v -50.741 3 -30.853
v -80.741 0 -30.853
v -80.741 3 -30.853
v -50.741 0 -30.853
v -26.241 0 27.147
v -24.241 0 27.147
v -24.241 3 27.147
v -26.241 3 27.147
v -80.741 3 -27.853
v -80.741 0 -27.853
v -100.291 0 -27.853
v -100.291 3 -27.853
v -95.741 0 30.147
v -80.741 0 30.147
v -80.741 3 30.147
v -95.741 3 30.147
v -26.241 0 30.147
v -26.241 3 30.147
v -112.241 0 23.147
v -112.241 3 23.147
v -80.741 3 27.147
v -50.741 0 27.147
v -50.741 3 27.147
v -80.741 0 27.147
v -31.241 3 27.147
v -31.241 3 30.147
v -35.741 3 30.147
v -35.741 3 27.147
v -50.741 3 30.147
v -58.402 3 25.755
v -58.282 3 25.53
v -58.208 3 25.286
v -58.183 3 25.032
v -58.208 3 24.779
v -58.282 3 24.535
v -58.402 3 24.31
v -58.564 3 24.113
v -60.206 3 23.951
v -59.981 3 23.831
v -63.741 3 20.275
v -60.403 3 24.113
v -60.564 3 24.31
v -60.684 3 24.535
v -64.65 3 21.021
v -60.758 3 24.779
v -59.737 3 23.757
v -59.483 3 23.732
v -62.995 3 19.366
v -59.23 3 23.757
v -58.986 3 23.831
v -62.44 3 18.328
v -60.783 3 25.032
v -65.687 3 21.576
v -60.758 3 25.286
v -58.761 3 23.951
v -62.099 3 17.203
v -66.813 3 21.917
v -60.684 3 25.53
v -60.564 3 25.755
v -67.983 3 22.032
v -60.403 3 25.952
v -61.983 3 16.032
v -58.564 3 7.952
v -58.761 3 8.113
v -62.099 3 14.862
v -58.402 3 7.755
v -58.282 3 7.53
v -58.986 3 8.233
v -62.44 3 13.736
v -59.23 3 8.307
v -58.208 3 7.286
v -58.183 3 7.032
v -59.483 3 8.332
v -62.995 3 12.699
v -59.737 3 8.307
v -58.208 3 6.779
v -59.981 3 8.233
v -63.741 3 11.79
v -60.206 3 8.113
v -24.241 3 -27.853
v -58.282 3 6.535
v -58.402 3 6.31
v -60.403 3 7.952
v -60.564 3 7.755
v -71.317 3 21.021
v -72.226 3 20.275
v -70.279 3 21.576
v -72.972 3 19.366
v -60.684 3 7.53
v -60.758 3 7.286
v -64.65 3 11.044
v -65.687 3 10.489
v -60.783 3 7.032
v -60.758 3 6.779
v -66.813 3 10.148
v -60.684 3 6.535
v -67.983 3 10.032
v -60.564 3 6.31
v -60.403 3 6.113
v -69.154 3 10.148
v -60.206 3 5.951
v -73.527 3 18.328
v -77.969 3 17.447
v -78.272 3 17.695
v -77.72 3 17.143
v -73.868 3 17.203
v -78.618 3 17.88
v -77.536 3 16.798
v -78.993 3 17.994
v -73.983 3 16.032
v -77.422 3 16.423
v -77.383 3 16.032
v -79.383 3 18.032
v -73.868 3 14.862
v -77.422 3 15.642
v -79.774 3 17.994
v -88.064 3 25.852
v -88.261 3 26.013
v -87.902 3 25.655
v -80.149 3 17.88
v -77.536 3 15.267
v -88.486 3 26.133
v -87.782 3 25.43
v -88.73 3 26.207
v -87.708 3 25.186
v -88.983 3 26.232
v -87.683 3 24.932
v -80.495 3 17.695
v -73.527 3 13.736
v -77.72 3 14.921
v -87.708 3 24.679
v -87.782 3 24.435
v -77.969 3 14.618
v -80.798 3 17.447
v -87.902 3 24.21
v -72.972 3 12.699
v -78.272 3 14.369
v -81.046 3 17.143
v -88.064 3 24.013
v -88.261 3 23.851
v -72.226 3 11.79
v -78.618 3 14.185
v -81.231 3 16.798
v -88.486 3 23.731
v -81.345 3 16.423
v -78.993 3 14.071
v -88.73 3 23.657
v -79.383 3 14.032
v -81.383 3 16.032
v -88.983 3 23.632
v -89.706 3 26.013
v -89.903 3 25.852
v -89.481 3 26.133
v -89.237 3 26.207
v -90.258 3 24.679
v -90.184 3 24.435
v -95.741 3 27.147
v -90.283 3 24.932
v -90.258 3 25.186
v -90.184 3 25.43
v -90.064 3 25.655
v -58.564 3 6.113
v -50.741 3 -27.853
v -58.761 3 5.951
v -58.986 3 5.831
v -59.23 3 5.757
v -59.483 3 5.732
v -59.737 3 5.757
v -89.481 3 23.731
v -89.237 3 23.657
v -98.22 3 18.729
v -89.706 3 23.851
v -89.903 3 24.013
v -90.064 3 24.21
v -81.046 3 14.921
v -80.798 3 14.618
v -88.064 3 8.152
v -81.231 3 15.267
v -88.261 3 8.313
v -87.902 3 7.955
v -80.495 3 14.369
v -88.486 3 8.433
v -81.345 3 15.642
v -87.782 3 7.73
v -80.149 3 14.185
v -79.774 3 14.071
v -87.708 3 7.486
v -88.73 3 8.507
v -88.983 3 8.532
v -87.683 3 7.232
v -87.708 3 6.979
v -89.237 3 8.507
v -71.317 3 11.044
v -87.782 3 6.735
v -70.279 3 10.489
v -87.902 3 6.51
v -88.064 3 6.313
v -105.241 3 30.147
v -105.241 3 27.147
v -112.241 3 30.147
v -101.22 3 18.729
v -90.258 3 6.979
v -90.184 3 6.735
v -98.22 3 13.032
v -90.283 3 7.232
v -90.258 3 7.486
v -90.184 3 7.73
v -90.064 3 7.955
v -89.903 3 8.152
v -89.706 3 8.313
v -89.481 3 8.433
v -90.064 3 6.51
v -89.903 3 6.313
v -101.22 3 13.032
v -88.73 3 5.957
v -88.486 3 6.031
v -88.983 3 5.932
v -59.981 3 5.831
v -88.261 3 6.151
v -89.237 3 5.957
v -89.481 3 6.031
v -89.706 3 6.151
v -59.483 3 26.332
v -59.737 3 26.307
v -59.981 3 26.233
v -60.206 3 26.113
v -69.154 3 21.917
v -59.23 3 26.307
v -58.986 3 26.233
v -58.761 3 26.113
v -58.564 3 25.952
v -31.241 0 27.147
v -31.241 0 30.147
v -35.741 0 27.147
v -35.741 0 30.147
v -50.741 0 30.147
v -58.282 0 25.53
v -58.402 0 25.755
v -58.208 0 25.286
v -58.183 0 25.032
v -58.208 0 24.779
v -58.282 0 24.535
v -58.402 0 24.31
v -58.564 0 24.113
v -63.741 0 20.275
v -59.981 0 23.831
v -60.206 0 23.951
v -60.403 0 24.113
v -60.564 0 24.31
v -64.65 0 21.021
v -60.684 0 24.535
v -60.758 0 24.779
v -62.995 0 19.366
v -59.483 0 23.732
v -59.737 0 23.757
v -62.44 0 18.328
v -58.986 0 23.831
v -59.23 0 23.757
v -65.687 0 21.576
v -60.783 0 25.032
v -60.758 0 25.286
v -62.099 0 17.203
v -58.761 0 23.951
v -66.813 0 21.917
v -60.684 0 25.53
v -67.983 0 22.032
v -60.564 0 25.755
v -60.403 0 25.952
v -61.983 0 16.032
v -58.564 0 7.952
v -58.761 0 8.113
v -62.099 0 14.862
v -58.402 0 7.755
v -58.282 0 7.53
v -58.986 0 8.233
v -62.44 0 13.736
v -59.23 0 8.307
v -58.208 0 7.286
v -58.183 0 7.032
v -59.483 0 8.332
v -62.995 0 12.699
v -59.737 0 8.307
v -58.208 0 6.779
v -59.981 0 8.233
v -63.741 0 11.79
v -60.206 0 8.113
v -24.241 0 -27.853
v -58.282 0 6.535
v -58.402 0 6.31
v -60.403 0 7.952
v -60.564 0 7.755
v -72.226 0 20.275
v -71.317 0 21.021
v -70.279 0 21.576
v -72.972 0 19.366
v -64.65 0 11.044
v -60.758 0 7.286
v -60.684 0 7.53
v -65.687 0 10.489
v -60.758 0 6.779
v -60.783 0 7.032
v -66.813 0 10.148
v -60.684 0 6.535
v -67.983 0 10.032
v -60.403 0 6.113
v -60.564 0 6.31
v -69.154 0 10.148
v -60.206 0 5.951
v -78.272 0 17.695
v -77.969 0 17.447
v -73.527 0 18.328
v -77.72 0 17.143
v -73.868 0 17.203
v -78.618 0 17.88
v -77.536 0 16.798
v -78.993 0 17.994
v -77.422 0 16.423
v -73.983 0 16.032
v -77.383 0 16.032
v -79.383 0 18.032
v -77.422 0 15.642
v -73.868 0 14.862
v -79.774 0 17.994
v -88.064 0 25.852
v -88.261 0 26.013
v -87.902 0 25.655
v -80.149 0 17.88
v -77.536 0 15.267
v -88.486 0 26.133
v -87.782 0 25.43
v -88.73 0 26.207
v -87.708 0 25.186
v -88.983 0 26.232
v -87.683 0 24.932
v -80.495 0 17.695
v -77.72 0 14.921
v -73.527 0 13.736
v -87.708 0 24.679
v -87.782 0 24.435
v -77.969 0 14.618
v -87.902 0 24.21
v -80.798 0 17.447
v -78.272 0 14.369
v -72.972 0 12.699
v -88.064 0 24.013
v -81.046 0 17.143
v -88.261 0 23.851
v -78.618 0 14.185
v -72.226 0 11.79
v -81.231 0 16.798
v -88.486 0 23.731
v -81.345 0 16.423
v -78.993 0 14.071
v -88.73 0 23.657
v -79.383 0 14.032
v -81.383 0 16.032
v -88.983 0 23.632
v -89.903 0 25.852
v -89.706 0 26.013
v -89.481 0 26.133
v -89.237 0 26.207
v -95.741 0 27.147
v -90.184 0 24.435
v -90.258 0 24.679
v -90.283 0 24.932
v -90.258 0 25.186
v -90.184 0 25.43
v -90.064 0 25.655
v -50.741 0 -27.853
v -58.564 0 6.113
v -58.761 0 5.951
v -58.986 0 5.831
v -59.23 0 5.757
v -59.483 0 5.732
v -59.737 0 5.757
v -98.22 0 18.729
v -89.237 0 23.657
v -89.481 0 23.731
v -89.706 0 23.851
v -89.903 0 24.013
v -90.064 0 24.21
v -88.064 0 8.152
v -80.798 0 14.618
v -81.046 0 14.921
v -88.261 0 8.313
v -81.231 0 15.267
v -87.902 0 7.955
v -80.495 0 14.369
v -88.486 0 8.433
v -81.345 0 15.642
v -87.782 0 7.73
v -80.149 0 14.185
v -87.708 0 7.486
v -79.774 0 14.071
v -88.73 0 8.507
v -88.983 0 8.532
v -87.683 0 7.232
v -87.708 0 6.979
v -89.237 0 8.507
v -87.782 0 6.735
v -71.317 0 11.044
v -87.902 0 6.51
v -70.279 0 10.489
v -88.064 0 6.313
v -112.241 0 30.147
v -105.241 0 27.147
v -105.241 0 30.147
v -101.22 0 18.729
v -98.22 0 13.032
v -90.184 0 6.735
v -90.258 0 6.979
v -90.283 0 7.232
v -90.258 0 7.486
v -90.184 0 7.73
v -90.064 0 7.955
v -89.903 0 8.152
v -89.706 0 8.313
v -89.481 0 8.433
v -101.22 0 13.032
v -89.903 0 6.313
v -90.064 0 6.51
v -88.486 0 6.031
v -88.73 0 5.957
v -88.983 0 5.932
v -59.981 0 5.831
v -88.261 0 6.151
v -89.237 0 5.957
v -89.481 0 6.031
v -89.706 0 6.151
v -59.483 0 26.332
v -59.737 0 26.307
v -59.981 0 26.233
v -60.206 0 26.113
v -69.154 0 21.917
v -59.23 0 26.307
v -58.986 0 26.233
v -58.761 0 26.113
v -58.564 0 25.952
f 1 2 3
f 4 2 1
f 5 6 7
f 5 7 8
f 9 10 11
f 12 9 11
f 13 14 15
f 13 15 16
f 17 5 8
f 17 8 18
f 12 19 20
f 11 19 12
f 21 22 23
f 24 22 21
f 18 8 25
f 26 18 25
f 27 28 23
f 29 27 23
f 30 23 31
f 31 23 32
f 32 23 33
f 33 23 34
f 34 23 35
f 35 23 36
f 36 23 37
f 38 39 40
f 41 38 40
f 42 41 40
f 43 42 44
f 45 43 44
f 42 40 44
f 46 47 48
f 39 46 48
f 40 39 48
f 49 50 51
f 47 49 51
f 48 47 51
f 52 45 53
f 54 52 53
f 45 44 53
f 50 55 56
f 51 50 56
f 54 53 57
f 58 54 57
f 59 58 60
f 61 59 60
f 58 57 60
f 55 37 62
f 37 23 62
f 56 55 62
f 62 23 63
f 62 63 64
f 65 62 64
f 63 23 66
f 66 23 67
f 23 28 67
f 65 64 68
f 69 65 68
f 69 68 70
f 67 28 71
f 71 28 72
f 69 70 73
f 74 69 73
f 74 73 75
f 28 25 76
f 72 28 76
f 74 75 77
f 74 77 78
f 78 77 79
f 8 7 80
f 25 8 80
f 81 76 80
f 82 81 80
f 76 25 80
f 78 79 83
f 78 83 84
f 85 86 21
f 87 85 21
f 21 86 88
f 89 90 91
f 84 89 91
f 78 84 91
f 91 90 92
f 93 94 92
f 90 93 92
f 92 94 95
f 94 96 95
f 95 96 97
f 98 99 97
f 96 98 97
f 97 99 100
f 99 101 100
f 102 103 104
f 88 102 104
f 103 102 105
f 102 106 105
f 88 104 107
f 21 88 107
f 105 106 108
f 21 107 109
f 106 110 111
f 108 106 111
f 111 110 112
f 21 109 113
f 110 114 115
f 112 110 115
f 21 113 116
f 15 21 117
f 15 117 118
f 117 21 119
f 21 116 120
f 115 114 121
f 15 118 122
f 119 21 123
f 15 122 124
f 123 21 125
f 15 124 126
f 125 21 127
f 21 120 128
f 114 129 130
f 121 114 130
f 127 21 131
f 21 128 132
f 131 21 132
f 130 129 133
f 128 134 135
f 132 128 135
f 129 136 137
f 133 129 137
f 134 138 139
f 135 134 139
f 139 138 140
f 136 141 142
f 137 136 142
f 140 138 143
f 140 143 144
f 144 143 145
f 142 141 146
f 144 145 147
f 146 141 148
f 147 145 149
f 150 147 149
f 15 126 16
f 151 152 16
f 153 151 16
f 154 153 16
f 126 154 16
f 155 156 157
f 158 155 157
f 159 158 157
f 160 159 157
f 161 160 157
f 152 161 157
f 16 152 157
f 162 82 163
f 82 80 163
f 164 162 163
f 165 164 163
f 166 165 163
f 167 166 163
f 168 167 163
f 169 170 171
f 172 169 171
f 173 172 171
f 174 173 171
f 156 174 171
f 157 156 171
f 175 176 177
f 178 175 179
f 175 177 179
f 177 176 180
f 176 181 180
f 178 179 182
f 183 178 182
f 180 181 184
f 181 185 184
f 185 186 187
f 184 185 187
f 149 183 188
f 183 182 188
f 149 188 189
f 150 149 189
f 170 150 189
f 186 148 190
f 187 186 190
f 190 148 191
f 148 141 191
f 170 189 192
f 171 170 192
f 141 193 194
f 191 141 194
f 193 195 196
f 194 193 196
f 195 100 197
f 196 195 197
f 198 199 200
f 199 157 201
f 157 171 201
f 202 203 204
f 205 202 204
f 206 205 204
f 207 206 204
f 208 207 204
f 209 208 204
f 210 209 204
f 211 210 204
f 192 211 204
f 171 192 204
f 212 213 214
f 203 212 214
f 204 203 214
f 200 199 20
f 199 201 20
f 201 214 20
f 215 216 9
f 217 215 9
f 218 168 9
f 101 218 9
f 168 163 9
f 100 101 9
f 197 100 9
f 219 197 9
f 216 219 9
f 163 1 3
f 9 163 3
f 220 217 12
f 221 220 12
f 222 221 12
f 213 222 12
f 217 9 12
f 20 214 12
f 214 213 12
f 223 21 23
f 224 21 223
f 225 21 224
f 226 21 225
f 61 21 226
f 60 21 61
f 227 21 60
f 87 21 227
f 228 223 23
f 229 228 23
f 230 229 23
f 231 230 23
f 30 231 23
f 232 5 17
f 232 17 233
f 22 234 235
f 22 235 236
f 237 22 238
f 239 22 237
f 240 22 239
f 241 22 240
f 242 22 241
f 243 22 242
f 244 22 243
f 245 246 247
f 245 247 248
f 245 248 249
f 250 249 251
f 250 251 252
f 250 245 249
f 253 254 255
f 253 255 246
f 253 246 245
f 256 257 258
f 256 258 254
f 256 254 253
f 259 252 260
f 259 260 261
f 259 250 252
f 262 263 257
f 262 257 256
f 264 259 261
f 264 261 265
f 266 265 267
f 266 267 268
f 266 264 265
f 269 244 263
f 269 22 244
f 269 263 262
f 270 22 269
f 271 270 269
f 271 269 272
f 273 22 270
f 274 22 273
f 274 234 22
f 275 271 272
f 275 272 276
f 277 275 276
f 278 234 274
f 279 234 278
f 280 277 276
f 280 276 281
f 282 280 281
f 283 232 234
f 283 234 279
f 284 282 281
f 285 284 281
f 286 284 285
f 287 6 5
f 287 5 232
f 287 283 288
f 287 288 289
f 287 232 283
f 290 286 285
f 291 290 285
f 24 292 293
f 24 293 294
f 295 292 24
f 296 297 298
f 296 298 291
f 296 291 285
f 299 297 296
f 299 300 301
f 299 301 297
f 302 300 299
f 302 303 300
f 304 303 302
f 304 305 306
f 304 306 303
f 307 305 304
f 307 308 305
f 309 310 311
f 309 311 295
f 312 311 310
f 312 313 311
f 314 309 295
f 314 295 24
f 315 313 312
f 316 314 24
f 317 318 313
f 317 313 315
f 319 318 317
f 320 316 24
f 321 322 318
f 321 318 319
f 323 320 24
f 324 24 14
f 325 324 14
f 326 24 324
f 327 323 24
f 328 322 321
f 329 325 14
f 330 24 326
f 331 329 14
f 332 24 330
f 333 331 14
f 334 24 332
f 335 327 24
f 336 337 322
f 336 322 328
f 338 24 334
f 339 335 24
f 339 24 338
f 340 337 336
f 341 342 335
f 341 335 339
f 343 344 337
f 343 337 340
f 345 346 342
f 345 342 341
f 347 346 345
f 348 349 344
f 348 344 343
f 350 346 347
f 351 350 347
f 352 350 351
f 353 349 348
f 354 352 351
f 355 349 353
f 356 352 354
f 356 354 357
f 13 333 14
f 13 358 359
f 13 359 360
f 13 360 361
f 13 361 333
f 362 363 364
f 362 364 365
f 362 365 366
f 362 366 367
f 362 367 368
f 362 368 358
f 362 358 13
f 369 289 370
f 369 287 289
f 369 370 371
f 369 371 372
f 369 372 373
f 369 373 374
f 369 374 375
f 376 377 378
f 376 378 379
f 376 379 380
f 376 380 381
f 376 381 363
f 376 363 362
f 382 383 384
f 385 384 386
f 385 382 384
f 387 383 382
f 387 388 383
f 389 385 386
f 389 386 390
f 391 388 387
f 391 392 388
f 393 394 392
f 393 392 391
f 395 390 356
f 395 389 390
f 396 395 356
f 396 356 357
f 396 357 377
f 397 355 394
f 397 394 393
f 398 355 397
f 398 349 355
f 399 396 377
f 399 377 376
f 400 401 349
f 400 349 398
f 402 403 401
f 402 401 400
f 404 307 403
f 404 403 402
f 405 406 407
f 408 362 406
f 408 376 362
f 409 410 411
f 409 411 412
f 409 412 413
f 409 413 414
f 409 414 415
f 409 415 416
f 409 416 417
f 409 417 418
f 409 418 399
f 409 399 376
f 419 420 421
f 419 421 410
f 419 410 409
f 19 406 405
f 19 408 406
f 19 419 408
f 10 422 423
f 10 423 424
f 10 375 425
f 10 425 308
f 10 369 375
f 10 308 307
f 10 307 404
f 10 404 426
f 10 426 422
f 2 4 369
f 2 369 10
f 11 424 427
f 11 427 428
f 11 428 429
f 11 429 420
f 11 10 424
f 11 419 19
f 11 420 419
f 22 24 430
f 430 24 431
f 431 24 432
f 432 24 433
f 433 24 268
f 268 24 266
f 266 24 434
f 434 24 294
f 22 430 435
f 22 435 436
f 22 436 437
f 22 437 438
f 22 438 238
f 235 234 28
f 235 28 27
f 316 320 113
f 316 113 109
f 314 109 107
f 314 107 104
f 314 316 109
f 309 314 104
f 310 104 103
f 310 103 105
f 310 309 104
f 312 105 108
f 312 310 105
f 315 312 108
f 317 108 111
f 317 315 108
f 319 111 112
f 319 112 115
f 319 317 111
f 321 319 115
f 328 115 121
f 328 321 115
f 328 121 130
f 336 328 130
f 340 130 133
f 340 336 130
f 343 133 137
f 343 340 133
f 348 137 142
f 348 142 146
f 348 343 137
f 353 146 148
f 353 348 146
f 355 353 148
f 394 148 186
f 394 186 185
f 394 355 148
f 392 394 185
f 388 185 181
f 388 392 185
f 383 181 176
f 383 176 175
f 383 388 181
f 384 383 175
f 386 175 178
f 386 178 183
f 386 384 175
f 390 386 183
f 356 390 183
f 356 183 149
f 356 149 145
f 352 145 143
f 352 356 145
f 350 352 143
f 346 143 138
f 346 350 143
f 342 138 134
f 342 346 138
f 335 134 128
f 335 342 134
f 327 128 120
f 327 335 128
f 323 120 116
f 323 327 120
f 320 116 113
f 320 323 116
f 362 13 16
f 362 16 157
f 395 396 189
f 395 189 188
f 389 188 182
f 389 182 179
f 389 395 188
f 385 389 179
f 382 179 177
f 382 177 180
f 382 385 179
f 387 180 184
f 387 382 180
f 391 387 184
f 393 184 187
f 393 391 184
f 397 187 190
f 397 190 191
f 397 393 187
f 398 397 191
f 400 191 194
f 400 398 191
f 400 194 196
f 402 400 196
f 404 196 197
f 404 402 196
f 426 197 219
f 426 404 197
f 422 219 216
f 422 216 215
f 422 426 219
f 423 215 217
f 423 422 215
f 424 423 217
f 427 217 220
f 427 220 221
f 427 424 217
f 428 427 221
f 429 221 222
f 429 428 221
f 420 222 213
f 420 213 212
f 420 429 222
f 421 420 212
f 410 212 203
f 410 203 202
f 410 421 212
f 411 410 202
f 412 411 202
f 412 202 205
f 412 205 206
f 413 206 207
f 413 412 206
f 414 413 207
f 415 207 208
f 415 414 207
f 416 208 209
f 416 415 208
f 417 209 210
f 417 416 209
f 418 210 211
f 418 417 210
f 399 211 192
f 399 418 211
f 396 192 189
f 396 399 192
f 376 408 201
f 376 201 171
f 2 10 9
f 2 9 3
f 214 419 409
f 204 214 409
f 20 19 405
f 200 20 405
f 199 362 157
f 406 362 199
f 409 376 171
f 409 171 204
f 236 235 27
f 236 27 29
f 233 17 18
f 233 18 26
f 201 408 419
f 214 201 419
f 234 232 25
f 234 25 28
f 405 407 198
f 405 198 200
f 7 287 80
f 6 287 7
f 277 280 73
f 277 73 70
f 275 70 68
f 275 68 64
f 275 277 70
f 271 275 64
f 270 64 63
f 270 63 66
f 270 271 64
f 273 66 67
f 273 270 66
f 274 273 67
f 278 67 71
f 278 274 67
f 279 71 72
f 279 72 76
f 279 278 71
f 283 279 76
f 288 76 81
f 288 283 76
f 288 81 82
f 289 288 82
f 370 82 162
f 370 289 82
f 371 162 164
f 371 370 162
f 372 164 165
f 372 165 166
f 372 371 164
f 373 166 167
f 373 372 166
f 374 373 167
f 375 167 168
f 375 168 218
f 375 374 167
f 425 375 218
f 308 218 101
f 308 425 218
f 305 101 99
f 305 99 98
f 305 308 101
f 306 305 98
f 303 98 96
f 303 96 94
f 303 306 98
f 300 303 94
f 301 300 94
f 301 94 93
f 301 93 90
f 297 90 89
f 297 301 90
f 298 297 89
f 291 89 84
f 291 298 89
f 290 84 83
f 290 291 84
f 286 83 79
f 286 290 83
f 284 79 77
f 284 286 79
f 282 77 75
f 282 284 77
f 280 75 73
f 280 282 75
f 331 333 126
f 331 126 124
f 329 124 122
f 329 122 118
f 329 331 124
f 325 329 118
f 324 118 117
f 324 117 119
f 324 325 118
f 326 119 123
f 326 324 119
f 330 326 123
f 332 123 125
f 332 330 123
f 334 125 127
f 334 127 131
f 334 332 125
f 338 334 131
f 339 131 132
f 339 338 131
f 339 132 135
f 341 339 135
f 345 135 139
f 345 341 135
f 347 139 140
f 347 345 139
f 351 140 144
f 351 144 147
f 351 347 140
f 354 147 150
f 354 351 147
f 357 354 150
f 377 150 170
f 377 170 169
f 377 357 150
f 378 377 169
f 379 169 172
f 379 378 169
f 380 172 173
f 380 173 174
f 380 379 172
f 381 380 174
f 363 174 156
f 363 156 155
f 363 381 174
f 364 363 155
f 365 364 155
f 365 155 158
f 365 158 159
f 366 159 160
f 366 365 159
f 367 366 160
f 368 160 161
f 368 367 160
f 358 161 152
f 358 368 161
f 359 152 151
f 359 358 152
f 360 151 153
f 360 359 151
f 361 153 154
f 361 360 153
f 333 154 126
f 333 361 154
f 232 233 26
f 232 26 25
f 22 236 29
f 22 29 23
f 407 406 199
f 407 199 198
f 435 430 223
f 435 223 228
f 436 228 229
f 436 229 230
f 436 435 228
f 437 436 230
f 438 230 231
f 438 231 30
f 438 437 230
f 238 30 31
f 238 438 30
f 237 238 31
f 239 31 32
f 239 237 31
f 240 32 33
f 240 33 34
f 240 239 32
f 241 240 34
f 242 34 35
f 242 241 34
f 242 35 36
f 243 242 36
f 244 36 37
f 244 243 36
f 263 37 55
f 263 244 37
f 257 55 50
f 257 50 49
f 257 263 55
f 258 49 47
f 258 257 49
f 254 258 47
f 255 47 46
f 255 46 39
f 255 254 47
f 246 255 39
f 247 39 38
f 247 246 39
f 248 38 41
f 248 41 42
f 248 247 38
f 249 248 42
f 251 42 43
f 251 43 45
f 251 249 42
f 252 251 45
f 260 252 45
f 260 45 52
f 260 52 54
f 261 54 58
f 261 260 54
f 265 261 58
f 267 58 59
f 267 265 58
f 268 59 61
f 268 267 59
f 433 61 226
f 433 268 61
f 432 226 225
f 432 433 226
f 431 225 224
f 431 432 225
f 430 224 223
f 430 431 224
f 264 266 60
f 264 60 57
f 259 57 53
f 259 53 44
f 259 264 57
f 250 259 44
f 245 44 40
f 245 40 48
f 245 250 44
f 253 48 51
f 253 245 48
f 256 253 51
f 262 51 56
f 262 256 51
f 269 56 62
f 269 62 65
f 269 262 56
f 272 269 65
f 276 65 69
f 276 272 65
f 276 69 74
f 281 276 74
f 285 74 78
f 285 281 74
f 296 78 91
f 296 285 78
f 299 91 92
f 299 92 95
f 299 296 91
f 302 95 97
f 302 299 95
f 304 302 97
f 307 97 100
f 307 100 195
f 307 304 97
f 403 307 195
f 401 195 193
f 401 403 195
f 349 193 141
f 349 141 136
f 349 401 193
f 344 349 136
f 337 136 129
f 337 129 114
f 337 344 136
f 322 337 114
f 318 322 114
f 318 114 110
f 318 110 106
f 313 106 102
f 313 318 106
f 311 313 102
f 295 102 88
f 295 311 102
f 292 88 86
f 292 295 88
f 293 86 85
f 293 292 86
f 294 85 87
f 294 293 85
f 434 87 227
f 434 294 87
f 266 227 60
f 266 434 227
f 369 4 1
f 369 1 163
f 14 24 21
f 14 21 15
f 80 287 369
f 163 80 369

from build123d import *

# Parameters (mm, degrees)
SKETCH1_R           = 2
SKETCH1_R_2         = 6
SKETCH1_R_3         = 1.3
SKETCH1_W           = 3
SKETCH1_H           = 5.696795919
BOSS_EXTRUDE1_DEPTH = 3


with BuildPart() as part:
    # Sketch1 → Boss-Extrude1 (new body)
    with BuildSketch(Plane(origin=(0, 0, 0), x_dir=(1, 0, 0), z_dir=(0, 1, 0))):
        Polygon((-95.740581995, 27.853387647), (-80.740581995, 27.853387647), (-80.740581995, 30.853387647), (-50.740581995, 30.853387647), (-50.740581995, 27.853387647), (-35.740581995, 27.853387647), (-26.240581995, 27.853387647), (-24.240581995, 27.853387647), (-24.240581995, -27.146612353), (-26.240581995, -27.146612353), (-26.240581995, -30.146612353), (-31.240581995, -30.146612353), (-31.240581995, -27.146612353), (-35.740581995, -27.146612353), (-35.740581995, -30.146612353), (-50.740581995, -30.146612353), (-50.740581995, -27.146612353), (-80.740581995, -27.146612353), (-80.740581995, -30.146612353), (-95.740581995, -30.146612353), (-95.740581995, -27.146612353), (-105.240581995, -27.146612353), (-105.240581995, -30.146612353), (-112.240581995, -30.146612353), (-112.240581995, -27.146612353), (-112.240581995, -23.146612353), (-100.290581995, 27.853387647), align=None)
        with Locations(Location((-79.383372271, -16.032348928, 0), (0, 0, 270))):
            Circle(SKETCH1_R, mode=Mode.SUBTRACT)
        with Locations(Location((-67.983372271, -16.032348928, 0), (0, 0, 270))):
            Circle(SKETCH1_R_2, mode=Mode.SUBTRACT)
        with Locations(Location((-59.483372271, -25.032348928, 0), (0, 0, 270))):
            Circle(SKETCH1_R_3, mode=Mode.SUBTRACT)
        with Locations(Location((-59.483372271, -7.032348928, 0), (0, 0, 270))):
            Circle(SKETCH1_R_3, mode=Mode.SUBTRACT)
        with Locations(Location((-88.98337227, -7.23234893, 0), (0, 0, 270))):
            Circle(SKETCH1_R_3, mode=Mode.SUBTRACT)
        with Locations(Location((-88.98337227, -24.93234893, 0), (0, 0, 270))):
            Circle(SKETCH1_R_3, mode=Mode.SUBTRACT)
        with Locations((-99.720235087, -15.880746888)):
            Rectangle(SKETCH1_W, SKETCH1_H, mode=Mode.SUBTRACT)
    extrude(amount=BOSS_EXTRUDE1_DEPTH)


solid = part.part
